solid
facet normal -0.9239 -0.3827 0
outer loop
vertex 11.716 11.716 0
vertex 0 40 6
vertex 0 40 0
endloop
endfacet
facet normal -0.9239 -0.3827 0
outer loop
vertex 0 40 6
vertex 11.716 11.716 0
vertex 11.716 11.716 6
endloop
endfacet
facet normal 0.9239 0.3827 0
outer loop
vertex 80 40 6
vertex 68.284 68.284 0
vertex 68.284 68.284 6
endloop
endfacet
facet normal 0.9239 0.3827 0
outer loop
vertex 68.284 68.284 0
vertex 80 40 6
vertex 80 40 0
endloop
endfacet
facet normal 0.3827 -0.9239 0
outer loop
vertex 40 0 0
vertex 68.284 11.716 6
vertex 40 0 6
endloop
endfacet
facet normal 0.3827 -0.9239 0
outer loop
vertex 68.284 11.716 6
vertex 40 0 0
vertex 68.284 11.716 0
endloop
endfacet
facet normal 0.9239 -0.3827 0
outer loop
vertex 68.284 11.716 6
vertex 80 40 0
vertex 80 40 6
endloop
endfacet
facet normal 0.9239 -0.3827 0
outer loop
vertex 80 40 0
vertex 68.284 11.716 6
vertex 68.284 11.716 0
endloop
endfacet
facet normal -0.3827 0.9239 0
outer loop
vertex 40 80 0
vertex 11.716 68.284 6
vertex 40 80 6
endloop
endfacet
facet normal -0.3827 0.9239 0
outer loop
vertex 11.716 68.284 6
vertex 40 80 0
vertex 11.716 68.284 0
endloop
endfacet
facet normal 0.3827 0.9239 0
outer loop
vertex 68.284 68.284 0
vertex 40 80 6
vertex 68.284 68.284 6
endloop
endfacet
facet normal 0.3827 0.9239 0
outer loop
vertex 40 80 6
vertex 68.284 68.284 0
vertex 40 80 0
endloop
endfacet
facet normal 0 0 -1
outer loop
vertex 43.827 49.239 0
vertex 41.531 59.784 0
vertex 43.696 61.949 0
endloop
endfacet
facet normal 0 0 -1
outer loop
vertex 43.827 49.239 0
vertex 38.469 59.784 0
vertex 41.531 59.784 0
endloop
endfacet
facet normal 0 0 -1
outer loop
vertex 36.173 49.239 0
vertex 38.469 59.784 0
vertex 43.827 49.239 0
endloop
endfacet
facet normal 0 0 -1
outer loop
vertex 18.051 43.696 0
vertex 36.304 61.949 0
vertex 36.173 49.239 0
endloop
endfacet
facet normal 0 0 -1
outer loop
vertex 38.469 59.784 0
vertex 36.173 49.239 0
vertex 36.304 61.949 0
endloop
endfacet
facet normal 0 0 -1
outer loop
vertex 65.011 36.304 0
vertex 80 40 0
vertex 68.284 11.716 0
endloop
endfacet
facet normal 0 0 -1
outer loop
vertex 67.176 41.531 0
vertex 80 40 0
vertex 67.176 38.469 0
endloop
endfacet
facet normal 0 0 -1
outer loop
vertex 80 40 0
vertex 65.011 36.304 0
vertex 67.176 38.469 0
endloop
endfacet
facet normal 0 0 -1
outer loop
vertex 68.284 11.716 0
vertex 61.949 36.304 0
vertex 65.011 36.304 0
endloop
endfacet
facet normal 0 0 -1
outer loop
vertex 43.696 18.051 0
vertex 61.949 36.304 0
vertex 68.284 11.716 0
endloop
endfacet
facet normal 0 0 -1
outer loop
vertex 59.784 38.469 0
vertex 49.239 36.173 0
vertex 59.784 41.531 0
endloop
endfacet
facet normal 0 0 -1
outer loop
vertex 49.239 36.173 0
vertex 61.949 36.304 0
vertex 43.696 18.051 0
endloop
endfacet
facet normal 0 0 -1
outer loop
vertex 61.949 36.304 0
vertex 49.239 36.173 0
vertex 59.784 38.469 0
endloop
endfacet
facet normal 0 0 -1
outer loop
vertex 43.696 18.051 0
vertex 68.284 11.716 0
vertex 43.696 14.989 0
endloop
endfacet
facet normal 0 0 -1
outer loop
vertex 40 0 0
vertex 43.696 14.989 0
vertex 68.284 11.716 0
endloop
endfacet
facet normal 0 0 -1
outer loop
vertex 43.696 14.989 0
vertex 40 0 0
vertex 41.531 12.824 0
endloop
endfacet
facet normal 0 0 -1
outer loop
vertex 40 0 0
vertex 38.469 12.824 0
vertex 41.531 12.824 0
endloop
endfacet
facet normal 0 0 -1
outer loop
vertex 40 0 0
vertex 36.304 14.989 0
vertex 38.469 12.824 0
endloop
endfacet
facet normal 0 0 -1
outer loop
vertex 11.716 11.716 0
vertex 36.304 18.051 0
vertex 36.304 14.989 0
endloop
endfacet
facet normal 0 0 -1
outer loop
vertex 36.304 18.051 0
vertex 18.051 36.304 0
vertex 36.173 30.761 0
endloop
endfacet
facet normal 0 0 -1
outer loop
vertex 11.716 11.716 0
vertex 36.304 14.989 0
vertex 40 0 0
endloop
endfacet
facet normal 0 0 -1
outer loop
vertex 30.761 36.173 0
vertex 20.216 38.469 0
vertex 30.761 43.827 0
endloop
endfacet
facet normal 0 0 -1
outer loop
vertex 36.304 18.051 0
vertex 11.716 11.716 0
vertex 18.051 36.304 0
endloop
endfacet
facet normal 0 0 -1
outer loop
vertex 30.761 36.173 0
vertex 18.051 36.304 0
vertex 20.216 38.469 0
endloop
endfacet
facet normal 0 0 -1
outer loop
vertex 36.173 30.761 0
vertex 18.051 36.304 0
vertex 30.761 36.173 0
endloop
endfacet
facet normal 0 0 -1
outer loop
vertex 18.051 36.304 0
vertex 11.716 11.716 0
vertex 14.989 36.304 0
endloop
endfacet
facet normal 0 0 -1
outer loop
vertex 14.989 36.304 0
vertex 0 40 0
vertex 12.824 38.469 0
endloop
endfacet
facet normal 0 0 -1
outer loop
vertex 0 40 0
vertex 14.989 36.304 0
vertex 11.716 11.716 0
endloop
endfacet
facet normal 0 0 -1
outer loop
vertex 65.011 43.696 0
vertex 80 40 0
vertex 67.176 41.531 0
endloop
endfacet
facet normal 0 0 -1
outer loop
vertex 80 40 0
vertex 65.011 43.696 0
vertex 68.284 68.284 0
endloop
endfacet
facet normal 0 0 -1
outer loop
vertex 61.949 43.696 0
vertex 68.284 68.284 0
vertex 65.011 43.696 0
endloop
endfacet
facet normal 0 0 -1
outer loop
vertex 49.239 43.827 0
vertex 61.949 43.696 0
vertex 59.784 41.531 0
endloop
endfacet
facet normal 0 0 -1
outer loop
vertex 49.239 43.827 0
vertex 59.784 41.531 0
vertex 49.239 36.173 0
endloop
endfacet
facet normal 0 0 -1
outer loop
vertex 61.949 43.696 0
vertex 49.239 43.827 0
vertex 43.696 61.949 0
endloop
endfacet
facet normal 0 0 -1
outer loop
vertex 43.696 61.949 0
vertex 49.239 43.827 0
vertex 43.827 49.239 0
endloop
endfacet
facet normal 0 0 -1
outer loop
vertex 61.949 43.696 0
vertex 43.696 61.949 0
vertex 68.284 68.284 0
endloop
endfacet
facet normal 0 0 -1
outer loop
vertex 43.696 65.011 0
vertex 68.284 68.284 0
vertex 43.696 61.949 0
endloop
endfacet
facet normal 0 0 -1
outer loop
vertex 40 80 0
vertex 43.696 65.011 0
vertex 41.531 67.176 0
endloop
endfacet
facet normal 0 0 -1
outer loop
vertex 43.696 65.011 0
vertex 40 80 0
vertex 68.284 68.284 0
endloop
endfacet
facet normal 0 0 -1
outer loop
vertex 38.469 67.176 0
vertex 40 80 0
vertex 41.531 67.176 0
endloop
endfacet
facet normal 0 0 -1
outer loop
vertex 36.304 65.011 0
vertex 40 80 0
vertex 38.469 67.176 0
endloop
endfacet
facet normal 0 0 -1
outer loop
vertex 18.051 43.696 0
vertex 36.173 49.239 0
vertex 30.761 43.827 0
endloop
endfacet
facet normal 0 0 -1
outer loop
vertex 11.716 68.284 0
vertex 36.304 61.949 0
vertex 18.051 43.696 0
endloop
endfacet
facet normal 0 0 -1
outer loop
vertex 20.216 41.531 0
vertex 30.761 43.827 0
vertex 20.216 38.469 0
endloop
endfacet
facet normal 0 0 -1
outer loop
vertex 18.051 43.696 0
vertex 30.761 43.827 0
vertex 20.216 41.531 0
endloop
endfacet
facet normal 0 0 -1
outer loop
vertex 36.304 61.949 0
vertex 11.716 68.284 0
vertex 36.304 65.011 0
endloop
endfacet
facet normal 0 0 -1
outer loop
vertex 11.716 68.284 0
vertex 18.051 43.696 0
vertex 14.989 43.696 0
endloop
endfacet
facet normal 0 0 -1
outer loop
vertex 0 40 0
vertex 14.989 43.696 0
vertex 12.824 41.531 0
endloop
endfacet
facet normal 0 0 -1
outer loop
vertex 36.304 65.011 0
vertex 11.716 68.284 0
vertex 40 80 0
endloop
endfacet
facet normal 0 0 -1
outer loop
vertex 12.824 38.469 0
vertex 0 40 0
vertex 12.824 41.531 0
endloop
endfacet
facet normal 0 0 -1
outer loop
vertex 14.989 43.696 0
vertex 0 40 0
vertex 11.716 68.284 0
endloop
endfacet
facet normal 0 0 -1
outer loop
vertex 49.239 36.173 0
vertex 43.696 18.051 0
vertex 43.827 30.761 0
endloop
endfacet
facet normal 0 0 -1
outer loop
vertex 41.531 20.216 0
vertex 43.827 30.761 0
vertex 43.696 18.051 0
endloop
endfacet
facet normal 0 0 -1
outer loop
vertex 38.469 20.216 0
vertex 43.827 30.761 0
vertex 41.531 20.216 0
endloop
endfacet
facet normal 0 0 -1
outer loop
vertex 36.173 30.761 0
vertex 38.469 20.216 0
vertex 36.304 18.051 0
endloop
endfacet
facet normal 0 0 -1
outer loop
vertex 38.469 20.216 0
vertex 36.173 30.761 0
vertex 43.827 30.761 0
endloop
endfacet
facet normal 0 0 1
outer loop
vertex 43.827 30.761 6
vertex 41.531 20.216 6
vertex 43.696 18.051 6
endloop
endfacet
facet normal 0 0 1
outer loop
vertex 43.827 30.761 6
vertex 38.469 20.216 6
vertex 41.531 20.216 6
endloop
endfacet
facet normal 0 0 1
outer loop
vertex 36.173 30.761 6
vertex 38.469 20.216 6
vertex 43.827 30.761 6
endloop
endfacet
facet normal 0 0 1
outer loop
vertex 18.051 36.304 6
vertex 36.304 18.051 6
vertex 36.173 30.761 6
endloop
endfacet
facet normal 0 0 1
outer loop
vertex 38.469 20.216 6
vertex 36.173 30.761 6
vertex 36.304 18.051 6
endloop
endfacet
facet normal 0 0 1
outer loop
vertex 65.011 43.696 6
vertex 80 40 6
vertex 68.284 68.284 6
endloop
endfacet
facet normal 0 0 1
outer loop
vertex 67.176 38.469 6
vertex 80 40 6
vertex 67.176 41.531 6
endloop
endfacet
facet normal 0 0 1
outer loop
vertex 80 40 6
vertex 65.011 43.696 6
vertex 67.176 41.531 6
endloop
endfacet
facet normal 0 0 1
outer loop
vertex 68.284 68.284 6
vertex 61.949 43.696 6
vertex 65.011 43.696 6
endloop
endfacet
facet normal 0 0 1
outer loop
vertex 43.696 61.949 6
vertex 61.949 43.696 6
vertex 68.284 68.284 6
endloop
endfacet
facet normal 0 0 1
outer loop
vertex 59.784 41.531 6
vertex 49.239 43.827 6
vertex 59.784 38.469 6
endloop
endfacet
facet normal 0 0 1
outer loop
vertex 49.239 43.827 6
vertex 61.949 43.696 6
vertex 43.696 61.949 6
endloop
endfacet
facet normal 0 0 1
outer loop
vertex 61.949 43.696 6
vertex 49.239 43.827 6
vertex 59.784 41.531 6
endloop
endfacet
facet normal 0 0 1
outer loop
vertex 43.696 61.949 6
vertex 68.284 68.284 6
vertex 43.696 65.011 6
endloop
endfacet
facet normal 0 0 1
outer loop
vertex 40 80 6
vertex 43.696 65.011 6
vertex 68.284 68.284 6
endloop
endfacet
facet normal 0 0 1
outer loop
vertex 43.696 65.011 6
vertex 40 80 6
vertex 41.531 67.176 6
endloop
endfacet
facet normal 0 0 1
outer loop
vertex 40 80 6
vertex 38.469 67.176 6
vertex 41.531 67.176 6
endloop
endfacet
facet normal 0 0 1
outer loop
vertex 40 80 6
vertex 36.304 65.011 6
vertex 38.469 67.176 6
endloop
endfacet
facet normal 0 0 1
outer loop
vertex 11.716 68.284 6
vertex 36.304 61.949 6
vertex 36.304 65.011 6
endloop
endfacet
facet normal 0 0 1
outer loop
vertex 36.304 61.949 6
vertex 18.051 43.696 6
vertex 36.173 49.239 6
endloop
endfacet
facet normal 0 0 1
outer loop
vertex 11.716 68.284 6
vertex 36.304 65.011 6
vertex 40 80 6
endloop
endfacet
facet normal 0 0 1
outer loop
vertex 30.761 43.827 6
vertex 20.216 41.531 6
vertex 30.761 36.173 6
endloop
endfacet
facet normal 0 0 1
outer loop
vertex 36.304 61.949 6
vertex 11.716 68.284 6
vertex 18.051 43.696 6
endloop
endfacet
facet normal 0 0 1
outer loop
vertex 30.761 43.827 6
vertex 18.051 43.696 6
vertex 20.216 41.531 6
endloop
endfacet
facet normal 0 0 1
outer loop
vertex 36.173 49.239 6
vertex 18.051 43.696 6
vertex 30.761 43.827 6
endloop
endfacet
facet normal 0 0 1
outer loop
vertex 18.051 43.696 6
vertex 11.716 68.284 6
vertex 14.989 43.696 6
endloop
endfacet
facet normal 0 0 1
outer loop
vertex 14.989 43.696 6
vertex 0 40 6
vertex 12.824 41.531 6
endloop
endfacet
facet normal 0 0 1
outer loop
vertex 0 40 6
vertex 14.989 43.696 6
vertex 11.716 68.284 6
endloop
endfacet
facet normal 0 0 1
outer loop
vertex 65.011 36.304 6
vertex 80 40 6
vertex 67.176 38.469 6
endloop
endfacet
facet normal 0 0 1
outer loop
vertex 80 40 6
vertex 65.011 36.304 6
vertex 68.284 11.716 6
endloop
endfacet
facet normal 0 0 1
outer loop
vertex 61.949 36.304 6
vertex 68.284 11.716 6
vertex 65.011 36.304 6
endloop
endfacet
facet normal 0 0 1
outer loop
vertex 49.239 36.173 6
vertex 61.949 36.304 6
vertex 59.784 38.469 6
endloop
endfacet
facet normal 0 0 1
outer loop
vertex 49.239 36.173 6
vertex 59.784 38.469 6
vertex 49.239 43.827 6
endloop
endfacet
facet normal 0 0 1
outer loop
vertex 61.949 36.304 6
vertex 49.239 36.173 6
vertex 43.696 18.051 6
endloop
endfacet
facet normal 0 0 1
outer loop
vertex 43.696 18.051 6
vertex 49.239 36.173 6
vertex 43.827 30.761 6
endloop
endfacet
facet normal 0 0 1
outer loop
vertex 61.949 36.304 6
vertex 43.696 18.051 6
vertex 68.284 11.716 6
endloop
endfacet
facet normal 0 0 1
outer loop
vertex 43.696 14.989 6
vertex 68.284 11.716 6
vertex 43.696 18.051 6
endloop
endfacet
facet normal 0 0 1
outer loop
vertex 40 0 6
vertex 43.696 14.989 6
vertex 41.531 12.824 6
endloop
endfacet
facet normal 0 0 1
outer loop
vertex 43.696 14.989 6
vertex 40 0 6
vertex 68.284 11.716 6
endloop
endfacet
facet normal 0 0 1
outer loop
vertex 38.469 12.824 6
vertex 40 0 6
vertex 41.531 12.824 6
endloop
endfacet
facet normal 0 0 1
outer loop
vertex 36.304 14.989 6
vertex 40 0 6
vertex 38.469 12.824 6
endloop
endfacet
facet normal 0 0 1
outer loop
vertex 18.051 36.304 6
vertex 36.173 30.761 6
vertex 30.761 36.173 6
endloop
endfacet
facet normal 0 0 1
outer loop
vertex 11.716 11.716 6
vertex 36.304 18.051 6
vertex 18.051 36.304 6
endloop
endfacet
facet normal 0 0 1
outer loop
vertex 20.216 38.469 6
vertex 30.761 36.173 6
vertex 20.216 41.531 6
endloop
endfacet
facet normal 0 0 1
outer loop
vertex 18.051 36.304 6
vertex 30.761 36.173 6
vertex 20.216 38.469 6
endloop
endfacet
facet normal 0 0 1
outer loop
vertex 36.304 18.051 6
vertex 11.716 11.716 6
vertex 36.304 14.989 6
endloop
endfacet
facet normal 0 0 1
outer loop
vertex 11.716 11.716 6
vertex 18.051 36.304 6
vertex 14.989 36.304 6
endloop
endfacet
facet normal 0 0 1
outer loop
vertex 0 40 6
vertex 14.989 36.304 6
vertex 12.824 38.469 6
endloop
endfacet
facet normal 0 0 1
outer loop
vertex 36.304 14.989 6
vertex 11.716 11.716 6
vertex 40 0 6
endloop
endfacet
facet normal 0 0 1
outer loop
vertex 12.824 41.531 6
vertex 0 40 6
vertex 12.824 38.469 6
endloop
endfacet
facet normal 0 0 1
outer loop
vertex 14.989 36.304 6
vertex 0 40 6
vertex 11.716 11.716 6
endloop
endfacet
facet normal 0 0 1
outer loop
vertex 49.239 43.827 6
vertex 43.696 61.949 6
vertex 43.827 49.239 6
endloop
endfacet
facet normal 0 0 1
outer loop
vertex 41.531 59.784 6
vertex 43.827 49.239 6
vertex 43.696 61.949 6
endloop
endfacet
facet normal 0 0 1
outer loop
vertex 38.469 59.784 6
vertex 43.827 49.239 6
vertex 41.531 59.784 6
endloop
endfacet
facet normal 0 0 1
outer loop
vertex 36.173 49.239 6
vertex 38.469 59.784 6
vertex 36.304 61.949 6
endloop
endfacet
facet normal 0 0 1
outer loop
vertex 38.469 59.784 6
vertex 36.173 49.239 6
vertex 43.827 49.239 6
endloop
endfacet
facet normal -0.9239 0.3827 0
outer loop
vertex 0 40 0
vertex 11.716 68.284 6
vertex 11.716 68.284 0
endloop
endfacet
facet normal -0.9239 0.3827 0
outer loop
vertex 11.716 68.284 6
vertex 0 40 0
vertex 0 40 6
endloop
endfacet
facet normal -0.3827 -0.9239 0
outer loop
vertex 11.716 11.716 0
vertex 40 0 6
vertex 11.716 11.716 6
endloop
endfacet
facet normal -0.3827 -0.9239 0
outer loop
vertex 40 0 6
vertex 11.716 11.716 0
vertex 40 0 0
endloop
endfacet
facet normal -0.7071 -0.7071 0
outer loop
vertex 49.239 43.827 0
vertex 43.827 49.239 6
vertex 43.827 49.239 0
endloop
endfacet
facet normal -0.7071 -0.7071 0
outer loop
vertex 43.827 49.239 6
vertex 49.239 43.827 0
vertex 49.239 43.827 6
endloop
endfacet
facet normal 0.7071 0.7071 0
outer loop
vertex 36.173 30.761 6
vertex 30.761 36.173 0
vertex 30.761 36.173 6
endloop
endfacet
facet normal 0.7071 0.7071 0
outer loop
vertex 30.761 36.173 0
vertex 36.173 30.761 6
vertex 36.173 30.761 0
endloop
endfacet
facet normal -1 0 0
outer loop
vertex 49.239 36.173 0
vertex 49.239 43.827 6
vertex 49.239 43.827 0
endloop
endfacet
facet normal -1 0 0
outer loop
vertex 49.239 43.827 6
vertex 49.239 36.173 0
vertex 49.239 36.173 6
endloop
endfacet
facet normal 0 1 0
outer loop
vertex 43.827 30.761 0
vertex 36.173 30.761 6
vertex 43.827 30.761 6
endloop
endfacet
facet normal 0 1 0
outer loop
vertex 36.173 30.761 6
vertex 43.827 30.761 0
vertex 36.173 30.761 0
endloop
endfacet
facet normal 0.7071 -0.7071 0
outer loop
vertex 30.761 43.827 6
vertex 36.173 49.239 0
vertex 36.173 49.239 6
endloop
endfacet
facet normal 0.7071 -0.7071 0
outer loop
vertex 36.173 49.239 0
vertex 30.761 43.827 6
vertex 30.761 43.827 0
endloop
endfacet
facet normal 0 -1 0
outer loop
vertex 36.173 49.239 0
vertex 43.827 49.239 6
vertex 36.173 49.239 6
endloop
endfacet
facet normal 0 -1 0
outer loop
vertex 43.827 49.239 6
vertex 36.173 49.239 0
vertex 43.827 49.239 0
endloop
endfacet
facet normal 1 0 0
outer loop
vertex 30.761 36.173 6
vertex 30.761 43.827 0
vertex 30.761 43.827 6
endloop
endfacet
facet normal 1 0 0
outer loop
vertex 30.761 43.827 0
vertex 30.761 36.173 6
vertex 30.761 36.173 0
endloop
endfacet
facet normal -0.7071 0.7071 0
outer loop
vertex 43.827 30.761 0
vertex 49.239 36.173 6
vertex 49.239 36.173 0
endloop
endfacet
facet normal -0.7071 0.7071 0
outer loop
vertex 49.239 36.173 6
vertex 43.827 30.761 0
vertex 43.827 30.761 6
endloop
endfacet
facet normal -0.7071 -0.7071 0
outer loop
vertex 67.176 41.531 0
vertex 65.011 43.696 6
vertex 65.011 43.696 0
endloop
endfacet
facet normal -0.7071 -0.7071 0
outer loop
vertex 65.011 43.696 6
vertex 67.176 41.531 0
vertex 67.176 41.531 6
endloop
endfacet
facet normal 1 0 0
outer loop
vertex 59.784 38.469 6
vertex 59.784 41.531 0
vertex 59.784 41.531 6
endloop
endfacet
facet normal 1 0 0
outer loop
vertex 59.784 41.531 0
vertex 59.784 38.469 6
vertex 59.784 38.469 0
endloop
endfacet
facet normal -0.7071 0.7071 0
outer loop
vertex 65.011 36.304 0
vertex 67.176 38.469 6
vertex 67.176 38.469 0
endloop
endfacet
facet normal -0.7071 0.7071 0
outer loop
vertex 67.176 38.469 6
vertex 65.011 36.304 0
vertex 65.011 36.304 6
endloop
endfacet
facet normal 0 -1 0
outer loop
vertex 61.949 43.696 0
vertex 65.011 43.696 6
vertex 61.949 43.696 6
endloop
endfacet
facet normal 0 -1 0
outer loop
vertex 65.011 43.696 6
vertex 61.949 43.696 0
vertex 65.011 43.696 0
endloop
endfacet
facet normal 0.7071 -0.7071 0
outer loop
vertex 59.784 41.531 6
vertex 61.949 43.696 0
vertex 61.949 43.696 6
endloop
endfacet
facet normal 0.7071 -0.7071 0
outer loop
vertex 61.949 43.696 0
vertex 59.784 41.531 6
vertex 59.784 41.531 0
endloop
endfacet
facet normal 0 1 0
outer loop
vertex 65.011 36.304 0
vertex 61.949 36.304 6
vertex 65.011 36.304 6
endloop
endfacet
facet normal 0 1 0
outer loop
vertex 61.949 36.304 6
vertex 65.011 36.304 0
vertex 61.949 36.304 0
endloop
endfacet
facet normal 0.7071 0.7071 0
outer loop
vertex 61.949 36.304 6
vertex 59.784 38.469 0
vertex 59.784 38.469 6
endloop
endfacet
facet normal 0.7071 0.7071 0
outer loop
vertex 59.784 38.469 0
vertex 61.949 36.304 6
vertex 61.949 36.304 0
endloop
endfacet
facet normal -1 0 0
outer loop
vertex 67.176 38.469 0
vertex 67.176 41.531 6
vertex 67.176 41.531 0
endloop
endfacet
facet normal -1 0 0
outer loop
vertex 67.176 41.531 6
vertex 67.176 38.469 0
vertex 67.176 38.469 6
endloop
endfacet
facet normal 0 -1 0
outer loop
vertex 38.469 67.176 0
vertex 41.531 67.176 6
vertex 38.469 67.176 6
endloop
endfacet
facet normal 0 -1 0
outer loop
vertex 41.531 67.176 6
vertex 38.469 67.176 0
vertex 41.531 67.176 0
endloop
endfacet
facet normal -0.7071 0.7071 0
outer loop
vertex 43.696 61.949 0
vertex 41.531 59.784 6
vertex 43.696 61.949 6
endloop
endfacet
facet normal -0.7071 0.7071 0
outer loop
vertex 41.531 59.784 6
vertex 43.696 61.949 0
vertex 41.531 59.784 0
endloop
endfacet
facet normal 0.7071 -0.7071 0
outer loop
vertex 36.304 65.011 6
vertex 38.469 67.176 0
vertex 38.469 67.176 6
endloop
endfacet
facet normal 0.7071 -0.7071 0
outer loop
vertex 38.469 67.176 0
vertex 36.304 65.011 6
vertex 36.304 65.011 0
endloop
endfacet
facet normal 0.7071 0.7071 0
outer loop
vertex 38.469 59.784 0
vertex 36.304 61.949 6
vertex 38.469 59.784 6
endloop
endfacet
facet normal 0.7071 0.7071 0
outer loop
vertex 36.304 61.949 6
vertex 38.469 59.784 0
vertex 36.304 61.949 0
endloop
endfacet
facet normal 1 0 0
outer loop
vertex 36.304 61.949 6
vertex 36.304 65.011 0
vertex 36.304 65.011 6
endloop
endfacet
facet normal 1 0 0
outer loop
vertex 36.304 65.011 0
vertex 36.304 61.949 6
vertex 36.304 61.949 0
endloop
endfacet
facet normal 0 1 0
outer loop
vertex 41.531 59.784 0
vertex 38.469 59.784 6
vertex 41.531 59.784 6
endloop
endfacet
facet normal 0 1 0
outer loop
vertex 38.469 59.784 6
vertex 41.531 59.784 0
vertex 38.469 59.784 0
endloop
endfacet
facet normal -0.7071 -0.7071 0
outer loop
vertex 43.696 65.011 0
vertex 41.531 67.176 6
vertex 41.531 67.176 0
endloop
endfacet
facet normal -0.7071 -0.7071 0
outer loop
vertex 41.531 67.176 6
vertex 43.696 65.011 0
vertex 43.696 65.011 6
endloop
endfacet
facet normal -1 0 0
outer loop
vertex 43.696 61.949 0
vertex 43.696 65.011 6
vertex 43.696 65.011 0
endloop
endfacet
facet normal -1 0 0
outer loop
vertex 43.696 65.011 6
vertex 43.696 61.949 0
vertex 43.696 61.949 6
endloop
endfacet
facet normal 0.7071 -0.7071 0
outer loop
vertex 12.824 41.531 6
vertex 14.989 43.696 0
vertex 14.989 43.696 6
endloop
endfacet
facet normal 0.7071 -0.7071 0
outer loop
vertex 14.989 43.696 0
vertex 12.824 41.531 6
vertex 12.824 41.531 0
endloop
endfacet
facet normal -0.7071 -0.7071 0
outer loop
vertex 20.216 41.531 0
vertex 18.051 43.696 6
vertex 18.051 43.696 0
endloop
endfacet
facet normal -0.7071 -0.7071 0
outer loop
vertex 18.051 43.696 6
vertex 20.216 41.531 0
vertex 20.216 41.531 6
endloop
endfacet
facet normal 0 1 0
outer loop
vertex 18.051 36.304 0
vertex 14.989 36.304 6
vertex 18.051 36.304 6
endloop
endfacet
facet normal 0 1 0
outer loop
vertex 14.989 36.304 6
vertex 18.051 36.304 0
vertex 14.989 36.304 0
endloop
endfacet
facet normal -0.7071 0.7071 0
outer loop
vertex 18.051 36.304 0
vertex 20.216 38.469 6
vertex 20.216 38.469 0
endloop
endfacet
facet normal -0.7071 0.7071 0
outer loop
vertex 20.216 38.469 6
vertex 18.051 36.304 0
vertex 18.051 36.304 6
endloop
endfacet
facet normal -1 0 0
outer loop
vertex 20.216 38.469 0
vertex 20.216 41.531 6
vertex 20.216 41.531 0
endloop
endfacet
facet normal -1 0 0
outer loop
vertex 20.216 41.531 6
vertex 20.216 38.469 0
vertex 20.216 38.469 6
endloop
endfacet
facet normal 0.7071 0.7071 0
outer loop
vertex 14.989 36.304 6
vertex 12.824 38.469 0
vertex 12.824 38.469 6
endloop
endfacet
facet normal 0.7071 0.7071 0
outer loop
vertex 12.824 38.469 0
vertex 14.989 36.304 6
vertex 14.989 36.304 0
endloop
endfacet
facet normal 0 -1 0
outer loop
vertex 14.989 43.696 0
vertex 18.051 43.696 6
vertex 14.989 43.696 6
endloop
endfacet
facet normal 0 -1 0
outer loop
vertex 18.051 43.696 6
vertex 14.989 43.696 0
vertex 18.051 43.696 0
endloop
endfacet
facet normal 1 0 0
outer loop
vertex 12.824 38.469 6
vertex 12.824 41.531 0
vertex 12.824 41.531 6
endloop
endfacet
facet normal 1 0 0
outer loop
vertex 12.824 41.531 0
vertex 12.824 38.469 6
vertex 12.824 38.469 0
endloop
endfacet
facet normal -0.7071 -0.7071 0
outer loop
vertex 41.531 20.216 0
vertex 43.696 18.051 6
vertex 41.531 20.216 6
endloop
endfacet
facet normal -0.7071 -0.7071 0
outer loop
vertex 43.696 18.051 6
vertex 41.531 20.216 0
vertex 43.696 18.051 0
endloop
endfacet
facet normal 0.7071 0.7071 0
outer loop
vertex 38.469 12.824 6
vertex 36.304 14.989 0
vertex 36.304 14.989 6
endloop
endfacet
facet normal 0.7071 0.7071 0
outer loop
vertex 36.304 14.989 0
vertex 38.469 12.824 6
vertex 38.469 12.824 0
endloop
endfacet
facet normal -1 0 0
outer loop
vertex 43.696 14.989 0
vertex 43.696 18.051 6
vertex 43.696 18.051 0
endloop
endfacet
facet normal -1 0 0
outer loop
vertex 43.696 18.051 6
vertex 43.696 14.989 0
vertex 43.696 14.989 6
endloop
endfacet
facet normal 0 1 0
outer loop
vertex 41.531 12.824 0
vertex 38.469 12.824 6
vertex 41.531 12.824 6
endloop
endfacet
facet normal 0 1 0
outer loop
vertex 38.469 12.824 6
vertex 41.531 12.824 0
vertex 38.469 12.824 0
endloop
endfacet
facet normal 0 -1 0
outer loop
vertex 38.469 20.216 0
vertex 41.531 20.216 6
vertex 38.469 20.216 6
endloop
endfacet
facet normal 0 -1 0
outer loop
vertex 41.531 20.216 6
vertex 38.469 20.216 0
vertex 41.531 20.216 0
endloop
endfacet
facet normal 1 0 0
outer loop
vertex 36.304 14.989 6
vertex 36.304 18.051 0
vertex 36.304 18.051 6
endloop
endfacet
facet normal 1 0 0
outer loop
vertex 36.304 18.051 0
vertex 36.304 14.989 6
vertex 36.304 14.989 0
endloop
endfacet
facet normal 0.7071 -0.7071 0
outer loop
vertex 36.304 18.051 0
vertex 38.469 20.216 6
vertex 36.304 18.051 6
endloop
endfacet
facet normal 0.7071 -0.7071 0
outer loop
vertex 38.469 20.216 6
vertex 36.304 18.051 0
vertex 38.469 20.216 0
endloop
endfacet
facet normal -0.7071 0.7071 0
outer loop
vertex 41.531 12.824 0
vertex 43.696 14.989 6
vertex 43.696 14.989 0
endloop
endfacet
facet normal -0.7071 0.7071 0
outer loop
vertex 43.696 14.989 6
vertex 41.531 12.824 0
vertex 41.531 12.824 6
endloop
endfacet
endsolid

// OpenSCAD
$fn = 32;

// ----------------------------------------------------------------------
// Polygon plate: 8-gon R40, 4 bolt windows
// ----------------------------------------------------------------------

// --- parameters (mm) ---
sides = 8;                // number of polygon sides
plate_r = 40;             // circumscribed radius of the polygon
bore_r = 10;              // centre bore radius
bolts = 4;                // number of bolt windows
ring_r = 23.48;           // bolt-circle radius
bolt_r = 4;               // bolt window radius
plate_t = 6;              // plate thickness, Z (extrusion height)

plate_d = 2 * plate_r;  // circumscribed diameter
bore_d = 2 * bore_r;  // centre bore diameter
bolt_d = 2 * bolt_r;  // bolt window diameter
ring_d = 2 * ring_r;  // bolt-circle diameter

profile = [[80, 40], [68.284, 68.284], [40, 80], [11.716, 68.284], [0, 40], [11.716, 11.716], [40, 0], [68.284, 11.716]];  // primary outline, 8 points, counter clockwise
void_1 = [[49.239, 43.827], [43.827, 49.239], [36.173, 49.239], [30.761, 43.827], [30.761, 36.173], [36.173, 30.761], [43.827, 30.761], [49.239, 36.173]];  // centre bore, 8 points
void_2 = [[67.176, 41.531], [65.011, 43.696], [61.949, 43.696], [59.784, 41.531], [59.784, 38.469], [61.949, 36.304], [65.011, 36.304], [67.176, 38.469]];  // bolt window 1, 8 points
void_3 = [[43.696, 65.011], [41.531, 67.176], [38.469, 67.176], [36.304, 65.011], [36.304, 61.949], [38.469, 59.784], [41.531, 59.784], [43.696, 61.949]];  // bolt window 2, 8 points
void_4 = [[20.216, 41.531], [18.051, 43.696], [14.989, 43.696], [12.824, 41.531], [12.824, 38.469], [14.989, 36.304], [18.051, 36.304], [20.216, 38.469]];  // bolt window 3, 8 points
void_5 = [[43.696, 18.051], [41.531, 20.216], [38.469, 20.216], [36.304, 18.051], [36.304, 14.989], [38.469, 12.824], [41.531, 12.824], [43.696, 14.989]];  // bolt window 4, 8 points

// --- the one profile operation ---
difference() {
  linear_extrude(height = plate_t) polygon(points = profile);
  translate([0, 0, -1])
    linear_extrude(height = plate_t + 2) polygon(points = void_1);
  translate([0, 0, -1])
    linear_extrude(height = plate_t + 2) polygon(points = void_2);
  translate([0, 0, -1])
    linear_extrude(height = plate_t + 2) polygon(points = void_3);
  translate([0, 0, -1])
    linear_extrude(height = plate_t + 2) polygon(points = void_4);
  translate([0, 0, -1])
    linear_extrude(height = plate_t + 2) polygon(points = void_5);
}
